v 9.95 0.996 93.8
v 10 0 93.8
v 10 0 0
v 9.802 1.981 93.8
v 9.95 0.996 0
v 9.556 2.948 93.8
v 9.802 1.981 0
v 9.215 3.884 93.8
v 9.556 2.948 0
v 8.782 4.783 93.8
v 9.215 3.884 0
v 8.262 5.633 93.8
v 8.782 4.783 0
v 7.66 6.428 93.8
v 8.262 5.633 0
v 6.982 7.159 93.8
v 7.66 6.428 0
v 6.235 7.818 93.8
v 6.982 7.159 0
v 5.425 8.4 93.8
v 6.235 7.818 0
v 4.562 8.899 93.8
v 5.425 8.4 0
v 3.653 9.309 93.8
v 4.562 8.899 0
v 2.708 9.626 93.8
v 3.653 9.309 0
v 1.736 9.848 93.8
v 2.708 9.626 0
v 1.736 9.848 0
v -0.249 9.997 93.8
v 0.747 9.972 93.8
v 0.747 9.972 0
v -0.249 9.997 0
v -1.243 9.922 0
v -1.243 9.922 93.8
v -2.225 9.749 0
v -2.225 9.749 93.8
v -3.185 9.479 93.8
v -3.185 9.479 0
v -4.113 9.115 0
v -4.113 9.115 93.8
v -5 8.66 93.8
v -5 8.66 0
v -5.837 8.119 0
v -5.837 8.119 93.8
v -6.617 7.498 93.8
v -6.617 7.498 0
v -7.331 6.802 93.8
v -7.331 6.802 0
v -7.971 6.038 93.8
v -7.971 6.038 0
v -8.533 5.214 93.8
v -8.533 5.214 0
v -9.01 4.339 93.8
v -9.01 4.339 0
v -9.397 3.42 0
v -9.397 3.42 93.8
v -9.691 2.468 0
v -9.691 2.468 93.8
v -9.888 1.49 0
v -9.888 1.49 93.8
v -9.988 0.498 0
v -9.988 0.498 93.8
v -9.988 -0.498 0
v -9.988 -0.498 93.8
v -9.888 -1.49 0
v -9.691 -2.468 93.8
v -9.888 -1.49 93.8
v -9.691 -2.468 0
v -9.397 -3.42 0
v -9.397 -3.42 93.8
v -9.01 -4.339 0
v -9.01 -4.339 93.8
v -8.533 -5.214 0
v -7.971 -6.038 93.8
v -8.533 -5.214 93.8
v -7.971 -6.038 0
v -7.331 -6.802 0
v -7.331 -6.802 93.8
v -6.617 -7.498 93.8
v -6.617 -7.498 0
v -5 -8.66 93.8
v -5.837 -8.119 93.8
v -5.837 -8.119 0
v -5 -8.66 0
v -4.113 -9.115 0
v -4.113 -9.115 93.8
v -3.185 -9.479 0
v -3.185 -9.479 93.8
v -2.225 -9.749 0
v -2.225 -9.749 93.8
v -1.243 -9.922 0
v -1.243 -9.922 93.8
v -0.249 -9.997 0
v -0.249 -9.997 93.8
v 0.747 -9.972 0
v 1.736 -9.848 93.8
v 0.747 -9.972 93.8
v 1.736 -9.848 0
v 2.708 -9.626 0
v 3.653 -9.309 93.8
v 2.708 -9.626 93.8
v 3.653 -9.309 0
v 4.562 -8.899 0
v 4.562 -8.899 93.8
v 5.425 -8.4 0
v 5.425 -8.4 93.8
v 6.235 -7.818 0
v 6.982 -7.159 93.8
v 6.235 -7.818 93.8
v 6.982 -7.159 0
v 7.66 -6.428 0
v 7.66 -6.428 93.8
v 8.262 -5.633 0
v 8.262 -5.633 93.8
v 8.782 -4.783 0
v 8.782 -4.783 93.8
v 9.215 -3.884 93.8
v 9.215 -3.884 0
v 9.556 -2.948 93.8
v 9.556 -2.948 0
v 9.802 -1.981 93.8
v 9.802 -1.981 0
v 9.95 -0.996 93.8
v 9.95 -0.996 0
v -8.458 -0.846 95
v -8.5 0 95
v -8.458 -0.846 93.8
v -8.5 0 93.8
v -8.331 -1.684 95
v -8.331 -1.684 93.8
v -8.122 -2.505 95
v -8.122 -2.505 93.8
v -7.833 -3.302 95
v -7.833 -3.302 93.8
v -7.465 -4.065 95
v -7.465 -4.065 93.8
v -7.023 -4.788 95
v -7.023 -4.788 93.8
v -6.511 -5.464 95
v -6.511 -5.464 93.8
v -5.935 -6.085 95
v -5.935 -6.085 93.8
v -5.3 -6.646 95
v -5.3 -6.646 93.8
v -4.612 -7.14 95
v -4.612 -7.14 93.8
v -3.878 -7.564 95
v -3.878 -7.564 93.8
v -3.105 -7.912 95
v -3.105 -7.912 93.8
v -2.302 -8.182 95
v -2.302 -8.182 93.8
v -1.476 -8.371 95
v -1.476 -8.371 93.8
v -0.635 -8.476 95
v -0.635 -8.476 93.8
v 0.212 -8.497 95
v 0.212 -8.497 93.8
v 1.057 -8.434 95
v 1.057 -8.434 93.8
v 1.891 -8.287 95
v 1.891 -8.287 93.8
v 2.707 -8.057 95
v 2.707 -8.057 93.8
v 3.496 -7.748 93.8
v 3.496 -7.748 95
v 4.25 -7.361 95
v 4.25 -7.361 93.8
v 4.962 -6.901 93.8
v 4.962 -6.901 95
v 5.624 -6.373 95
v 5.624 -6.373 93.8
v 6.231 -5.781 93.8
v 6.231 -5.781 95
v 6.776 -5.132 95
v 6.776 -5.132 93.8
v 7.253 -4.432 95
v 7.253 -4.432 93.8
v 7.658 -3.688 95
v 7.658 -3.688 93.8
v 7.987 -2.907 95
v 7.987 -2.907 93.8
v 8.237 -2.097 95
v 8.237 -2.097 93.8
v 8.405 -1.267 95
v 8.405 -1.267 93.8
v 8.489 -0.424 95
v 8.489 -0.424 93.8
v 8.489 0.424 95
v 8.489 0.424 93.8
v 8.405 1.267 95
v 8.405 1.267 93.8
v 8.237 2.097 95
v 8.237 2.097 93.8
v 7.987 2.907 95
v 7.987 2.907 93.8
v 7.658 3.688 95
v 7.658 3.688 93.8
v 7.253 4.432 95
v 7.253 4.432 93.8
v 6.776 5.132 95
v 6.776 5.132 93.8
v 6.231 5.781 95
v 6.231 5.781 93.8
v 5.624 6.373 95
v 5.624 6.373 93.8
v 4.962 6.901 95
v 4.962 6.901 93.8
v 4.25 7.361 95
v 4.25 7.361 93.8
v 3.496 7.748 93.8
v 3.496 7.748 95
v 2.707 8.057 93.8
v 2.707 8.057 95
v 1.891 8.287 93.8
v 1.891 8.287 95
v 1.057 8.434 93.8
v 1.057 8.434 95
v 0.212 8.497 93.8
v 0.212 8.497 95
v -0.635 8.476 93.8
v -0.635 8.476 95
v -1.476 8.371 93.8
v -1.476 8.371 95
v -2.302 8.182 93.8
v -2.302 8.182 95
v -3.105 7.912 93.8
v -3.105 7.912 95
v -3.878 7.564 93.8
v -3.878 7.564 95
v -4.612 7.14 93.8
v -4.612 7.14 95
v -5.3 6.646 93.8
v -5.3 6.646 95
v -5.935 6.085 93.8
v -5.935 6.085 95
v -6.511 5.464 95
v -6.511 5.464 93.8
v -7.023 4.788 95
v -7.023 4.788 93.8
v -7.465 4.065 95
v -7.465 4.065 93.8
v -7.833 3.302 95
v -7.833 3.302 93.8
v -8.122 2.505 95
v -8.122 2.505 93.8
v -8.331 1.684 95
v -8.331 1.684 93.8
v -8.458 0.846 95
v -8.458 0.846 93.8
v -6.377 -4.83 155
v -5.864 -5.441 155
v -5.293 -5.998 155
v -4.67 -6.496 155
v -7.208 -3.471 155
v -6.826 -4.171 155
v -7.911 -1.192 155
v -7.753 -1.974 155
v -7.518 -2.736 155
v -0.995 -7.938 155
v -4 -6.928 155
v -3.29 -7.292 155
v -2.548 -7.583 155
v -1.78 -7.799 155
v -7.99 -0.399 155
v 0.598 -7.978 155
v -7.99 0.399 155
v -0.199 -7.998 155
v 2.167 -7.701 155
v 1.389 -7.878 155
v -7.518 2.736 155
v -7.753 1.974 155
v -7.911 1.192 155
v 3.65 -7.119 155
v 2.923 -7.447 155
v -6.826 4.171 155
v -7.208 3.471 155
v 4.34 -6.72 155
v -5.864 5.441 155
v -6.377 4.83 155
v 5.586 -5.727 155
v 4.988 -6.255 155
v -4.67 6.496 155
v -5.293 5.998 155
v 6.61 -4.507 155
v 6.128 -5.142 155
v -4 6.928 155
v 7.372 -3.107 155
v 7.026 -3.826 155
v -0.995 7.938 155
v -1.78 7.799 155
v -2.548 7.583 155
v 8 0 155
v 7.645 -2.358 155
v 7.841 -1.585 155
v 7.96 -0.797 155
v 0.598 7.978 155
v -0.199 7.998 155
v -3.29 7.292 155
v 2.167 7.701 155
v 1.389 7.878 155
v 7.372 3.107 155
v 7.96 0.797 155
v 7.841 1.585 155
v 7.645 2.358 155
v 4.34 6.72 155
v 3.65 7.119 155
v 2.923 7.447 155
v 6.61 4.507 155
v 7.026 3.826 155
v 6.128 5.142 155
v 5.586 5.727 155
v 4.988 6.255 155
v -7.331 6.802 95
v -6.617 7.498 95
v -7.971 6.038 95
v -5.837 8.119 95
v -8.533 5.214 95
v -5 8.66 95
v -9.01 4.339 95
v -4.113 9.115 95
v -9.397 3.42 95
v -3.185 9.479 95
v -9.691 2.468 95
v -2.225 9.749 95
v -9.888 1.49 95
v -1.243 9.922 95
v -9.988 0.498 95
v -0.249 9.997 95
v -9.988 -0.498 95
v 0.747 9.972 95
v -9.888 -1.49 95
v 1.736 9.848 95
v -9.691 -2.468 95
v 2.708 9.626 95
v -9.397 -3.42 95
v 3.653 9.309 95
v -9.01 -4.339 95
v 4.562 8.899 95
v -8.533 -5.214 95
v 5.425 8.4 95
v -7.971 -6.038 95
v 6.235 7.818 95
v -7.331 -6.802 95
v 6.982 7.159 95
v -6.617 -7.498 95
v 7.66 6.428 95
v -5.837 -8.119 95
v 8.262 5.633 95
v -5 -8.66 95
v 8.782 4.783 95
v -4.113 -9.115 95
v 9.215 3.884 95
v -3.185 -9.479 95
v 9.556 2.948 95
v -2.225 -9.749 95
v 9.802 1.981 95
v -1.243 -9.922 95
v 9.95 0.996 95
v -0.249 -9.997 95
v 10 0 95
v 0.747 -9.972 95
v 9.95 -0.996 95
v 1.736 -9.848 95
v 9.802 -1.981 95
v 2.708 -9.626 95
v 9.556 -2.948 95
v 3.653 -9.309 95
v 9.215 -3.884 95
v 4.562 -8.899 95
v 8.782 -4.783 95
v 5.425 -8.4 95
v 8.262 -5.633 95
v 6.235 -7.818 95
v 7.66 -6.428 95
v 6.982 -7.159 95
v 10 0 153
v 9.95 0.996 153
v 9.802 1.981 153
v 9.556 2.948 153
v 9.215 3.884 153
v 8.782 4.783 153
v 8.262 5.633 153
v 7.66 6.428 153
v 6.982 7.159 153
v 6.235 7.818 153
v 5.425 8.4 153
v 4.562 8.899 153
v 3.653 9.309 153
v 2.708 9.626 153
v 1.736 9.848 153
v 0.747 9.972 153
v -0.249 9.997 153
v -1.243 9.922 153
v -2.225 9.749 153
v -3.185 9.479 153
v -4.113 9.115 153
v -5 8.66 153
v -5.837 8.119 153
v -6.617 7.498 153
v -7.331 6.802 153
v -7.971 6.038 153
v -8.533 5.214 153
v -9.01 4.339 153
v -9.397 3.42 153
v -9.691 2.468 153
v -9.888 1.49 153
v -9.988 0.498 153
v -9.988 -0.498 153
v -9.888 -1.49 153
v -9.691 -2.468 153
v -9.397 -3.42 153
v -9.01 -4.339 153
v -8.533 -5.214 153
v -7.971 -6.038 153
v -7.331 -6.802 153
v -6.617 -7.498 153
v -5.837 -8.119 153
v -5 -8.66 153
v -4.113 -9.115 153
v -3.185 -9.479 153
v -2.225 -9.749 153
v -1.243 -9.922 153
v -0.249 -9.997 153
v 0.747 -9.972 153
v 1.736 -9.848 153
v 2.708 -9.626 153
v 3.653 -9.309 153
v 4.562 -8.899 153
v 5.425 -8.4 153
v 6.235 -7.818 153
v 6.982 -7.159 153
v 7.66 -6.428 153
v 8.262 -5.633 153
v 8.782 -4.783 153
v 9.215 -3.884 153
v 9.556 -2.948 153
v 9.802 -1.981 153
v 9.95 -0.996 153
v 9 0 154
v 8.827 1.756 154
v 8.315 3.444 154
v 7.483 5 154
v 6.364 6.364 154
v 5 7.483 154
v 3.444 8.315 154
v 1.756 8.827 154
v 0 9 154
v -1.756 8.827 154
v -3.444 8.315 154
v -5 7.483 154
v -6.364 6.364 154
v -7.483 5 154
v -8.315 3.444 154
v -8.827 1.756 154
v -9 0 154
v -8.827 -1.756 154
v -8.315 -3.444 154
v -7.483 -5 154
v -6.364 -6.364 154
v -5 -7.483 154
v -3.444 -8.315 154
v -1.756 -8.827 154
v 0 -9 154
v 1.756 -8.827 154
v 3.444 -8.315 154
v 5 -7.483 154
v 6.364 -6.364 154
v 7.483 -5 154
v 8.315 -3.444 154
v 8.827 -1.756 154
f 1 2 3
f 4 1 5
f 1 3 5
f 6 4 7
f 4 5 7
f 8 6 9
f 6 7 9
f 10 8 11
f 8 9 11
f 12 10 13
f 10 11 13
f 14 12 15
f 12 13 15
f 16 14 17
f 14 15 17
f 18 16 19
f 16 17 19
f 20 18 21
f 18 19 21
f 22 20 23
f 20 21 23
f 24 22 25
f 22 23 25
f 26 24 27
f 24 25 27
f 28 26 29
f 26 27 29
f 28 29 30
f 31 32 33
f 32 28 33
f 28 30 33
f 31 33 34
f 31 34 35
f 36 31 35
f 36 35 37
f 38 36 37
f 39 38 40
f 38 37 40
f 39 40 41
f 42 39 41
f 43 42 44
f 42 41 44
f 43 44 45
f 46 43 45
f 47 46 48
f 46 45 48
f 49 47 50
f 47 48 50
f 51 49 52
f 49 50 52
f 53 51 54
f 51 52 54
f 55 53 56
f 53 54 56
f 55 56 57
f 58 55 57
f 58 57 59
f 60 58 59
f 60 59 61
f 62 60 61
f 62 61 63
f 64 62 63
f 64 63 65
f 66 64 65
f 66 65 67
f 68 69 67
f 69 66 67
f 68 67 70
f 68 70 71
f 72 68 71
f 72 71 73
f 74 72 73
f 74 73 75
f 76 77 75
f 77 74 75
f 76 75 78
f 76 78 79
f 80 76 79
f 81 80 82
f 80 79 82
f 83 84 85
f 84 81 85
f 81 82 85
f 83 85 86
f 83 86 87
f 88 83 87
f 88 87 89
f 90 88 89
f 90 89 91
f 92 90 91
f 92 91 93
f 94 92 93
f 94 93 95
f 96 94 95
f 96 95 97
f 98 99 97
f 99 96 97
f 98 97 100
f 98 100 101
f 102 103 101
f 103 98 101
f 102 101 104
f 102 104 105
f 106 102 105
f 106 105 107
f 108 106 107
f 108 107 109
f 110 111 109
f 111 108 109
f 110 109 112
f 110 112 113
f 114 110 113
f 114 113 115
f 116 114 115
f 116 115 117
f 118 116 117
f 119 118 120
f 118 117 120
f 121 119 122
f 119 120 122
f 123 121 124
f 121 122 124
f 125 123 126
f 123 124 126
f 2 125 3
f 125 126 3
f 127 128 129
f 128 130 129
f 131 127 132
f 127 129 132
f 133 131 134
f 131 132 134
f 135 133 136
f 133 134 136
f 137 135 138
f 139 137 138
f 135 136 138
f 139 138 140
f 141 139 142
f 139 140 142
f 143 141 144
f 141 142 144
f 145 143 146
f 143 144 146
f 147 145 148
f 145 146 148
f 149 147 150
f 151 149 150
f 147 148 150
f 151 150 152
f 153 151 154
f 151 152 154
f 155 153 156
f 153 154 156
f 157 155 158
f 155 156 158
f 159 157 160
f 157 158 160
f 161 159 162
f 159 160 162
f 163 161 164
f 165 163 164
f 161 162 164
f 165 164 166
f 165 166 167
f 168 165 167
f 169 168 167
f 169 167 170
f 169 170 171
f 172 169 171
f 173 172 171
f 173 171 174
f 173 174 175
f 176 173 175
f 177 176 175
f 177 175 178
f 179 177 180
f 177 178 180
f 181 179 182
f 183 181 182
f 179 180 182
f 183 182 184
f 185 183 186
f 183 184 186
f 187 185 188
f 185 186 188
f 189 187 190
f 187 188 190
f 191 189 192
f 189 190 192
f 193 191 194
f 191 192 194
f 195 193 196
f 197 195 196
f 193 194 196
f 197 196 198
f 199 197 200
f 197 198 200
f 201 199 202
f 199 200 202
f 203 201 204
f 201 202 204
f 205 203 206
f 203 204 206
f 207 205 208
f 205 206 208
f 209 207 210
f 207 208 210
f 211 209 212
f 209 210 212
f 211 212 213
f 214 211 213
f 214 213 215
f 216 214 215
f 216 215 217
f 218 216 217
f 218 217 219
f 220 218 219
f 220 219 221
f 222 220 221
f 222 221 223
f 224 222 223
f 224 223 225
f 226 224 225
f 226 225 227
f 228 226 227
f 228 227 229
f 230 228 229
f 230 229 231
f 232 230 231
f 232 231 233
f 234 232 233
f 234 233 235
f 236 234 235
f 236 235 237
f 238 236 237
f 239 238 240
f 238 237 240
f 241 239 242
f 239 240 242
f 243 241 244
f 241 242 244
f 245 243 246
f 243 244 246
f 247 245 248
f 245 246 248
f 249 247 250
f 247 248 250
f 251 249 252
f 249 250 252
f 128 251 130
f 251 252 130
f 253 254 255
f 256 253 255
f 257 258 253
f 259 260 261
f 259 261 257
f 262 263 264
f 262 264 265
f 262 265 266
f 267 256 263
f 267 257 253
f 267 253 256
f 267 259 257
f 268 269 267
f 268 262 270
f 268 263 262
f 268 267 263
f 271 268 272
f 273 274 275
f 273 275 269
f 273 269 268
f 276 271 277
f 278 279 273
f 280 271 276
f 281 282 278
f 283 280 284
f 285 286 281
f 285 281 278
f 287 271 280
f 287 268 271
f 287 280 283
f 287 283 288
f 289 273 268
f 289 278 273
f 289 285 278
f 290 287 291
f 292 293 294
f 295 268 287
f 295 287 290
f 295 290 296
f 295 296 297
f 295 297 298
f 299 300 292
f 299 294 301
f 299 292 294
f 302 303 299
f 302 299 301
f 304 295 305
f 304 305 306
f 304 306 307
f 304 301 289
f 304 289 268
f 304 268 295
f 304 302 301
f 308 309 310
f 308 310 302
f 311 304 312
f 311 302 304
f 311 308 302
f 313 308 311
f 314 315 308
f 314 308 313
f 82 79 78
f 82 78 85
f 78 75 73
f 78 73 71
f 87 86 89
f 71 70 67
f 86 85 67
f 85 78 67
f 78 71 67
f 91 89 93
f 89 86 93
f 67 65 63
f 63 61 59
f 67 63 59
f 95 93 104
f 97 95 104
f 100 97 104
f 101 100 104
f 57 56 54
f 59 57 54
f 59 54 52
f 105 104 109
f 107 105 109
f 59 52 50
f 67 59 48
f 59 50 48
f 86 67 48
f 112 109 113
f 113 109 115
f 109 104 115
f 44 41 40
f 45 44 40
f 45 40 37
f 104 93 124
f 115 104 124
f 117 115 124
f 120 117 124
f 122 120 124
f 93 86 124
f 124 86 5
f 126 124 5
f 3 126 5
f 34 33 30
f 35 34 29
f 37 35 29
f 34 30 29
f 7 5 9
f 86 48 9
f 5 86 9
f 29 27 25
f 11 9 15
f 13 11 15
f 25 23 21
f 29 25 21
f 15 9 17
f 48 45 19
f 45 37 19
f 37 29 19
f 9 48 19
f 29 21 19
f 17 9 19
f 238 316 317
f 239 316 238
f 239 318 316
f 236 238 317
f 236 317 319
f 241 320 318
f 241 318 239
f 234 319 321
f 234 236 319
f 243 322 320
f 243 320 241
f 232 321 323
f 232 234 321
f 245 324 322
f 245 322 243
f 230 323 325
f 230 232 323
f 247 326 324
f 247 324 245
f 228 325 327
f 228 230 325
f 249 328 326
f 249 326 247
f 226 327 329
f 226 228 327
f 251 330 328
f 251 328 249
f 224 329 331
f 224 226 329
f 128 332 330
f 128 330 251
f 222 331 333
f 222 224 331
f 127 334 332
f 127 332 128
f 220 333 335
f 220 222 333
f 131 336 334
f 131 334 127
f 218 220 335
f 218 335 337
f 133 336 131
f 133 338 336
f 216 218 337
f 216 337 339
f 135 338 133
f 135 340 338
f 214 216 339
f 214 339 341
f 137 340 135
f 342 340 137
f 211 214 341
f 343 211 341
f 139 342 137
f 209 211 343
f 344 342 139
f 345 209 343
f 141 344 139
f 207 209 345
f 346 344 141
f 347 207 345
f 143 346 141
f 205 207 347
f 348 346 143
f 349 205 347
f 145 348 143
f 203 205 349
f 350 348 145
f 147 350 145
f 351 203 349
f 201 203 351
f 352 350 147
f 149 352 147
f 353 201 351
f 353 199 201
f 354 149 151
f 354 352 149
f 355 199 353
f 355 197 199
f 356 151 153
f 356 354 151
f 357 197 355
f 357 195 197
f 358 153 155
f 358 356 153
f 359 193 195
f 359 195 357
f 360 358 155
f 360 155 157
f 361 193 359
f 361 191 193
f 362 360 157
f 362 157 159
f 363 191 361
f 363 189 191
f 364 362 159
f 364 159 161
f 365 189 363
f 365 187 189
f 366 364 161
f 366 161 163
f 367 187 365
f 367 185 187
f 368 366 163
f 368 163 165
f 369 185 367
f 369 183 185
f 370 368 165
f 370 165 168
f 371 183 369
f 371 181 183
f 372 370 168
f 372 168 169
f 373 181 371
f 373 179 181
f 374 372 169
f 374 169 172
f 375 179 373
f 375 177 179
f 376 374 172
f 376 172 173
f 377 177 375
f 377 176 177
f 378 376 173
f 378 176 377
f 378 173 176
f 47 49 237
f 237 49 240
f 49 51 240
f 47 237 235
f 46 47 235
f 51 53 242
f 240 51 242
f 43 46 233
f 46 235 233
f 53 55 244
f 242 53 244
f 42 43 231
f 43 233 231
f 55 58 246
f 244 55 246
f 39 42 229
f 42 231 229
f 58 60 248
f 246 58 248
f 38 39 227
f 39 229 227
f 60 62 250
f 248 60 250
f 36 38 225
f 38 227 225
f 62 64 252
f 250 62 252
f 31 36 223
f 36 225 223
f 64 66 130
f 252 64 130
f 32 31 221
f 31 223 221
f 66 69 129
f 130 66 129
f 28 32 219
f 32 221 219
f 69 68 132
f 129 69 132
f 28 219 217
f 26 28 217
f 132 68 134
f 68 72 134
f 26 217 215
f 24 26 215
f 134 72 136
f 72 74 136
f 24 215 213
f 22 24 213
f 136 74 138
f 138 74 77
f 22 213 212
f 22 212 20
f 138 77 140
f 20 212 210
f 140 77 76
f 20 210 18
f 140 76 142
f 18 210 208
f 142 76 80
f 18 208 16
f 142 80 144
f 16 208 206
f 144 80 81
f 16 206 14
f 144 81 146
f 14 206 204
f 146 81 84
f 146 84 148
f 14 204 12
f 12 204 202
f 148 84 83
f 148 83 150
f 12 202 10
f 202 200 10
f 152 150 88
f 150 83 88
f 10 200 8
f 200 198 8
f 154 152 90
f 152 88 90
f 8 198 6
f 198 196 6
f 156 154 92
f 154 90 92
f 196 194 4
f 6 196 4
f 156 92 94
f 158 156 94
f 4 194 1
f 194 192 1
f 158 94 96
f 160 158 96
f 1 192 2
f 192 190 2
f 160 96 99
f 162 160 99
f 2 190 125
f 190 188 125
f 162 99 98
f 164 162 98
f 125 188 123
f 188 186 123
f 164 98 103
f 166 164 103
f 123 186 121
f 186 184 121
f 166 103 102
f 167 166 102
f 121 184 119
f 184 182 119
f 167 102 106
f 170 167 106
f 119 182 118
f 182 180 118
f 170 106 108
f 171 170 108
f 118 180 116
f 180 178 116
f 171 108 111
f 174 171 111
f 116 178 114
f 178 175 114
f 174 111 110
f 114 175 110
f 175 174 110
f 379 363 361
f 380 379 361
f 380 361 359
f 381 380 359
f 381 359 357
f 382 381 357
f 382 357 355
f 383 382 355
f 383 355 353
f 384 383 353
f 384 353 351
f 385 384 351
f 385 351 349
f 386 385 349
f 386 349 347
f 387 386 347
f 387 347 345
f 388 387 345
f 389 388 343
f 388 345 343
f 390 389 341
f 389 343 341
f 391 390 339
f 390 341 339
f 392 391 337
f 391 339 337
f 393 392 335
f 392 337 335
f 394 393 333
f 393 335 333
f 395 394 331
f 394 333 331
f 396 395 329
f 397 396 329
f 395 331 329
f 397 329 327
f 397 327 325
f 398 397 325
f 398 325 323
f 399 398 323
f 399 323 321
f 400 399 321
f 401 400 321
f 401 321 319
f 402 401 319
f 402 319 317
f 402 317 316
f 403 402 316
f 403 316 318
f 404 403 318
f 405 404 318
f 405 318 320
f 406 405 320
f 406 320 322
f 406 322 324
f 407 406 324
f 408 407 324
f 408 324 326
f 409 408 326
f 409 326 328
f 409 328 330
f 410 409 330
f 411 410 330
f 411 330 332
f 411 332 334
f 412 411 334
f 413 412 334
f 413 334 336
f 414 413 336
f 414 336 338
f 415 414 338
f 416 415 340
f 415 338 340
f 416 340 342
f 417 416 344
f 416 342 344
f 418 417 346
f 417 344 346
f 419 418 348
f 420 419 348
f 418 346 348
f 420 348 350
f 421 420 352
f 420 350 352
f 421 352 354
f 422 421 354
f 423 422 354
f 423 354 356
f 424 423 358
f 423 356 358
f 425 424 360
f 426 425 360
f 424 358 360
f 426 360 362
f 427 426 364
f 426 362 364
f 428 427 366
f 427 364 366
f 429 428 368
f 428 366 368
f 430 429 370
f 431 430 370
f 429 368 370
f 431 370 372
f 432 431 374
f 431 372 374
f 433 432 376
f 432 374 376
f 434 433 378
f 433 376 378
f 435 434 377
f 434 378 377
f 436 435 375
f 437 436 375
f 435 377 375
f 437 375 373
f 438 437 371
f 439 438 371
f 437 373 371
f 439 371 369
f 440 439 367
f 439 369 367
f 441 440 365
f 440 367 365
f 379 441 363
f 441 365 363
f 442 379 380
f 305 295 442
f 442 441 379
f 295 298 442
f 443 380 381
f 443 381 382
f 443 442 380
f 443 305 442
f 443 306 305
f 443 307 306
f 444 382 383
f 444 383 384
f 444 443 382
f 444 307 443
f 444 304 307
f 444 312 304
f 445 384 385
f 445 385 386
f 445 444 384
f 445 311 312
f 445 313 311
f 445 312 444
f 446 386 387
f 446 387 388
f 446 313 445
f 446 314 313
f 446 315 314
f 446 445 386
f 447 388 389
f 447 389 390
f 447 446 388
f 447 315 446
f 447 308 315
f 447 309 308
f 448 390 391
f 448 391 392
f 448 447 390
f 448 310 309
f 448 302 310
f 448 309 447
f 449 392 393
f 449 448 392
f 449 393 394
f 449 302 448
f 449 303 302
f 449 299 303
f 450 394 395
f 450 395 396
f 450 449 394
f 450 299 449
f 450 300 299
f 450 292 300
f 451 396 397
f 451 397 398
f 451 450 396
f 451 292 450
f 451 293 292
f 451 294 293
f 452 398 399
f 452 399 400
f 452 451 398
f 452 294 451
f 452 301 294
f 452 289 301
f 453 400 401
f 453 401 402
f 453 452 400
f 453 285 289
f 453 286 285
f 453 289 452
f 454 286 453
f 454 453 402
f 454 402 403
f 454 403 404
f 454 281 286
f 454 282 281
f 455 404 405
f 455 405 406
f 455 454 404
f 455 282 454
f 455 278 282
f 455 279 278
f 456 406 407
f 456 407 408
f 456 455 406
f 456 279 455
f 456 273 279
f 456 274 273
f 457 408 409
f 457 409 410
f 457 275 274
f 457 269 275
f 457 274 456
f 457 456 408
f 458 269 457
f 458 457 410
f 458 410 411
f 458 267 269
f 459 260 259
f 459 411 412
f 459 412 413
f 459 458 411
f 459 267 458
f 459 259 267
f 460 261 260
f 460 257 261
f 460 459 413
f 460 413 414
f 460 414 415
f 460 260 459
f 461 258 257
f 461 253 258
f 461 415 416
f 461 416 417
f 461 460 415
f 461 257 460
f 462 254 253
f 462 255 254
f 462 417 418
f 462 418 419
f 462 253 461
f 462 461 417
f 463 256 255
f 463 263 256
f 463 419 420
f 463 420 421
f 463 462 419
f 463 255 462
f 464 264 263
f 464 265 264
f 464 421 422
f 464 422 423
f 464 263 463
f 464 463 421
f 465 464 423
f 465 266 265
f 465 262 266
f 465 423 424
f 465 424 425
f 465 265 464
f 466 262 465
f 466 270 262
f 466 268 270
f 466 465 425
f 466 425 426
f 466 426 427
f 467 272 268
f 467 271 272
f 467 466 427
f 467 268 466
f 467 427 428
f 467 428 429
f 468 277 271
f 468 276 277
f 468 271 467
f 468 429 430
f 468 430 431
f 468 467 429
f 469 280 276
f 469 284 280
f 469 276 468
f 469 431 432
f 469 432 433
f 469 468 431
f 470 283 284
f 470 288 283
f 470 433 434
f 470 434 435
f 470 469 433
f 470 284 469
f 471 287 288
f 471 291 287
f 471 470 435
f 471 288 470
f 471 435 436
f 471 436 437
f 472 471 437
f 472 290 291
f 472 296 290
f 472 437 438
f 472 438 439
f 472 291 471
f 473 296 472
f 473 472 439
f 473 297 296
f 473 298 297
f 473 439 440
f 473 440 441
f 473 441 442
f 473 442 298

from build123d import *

# Parameters (mm, degrees)
SZKIC1_R                    = 10
DODANIE_WYCI_GNI_CIE1_DEPTH = 155
SFAZOWANIE2_SIZE            = 2
SZKIC2_W                    = 1.5
SZKIC2_H                    = 1.2


with BuildPart() as part:
    # Szkic1 → Dodanie-wyciągnięcie1 (new body)
    with BuildSketch(Plane.XY):
        Circle(SZKIC1_R)
    extrude(amount=DODANIE_WYCI_GNI_CIE1_DEPTH)

    # Sfazowanie2
    sfazowanie2_edges = [part.edges().sort_by_distance(p)[0] for p in [
        (-10, 0, 155),
    ]]
    chamfer(sfazowanie2_edges, length=SFAZOWANIE2_SIZE)

    # Szkic2 → Wycięcie-obrót1 (revolve, cut)
    with BuildSketch(Plane(origin=(0, 0, 0), x_dir=(1, 0, 0), z_dir=(0, 1, 0)), mode=Mode.PRIVATE) as wyci_cie_obr_t1_sk:
        with Locations((9.25, -94.4)):
            Rectangle(SZKIC2_W, SZKIC2_H)
    revolve(wyci_cie_obr_t1_sk.sketch.rotate(Axis((0, 0, 0), (0, 0, 1)), 180), axis=Axis((0, 0, 0), (0, 0, 1)), mode=Mode.SUBTRACT)


solid = part.part
